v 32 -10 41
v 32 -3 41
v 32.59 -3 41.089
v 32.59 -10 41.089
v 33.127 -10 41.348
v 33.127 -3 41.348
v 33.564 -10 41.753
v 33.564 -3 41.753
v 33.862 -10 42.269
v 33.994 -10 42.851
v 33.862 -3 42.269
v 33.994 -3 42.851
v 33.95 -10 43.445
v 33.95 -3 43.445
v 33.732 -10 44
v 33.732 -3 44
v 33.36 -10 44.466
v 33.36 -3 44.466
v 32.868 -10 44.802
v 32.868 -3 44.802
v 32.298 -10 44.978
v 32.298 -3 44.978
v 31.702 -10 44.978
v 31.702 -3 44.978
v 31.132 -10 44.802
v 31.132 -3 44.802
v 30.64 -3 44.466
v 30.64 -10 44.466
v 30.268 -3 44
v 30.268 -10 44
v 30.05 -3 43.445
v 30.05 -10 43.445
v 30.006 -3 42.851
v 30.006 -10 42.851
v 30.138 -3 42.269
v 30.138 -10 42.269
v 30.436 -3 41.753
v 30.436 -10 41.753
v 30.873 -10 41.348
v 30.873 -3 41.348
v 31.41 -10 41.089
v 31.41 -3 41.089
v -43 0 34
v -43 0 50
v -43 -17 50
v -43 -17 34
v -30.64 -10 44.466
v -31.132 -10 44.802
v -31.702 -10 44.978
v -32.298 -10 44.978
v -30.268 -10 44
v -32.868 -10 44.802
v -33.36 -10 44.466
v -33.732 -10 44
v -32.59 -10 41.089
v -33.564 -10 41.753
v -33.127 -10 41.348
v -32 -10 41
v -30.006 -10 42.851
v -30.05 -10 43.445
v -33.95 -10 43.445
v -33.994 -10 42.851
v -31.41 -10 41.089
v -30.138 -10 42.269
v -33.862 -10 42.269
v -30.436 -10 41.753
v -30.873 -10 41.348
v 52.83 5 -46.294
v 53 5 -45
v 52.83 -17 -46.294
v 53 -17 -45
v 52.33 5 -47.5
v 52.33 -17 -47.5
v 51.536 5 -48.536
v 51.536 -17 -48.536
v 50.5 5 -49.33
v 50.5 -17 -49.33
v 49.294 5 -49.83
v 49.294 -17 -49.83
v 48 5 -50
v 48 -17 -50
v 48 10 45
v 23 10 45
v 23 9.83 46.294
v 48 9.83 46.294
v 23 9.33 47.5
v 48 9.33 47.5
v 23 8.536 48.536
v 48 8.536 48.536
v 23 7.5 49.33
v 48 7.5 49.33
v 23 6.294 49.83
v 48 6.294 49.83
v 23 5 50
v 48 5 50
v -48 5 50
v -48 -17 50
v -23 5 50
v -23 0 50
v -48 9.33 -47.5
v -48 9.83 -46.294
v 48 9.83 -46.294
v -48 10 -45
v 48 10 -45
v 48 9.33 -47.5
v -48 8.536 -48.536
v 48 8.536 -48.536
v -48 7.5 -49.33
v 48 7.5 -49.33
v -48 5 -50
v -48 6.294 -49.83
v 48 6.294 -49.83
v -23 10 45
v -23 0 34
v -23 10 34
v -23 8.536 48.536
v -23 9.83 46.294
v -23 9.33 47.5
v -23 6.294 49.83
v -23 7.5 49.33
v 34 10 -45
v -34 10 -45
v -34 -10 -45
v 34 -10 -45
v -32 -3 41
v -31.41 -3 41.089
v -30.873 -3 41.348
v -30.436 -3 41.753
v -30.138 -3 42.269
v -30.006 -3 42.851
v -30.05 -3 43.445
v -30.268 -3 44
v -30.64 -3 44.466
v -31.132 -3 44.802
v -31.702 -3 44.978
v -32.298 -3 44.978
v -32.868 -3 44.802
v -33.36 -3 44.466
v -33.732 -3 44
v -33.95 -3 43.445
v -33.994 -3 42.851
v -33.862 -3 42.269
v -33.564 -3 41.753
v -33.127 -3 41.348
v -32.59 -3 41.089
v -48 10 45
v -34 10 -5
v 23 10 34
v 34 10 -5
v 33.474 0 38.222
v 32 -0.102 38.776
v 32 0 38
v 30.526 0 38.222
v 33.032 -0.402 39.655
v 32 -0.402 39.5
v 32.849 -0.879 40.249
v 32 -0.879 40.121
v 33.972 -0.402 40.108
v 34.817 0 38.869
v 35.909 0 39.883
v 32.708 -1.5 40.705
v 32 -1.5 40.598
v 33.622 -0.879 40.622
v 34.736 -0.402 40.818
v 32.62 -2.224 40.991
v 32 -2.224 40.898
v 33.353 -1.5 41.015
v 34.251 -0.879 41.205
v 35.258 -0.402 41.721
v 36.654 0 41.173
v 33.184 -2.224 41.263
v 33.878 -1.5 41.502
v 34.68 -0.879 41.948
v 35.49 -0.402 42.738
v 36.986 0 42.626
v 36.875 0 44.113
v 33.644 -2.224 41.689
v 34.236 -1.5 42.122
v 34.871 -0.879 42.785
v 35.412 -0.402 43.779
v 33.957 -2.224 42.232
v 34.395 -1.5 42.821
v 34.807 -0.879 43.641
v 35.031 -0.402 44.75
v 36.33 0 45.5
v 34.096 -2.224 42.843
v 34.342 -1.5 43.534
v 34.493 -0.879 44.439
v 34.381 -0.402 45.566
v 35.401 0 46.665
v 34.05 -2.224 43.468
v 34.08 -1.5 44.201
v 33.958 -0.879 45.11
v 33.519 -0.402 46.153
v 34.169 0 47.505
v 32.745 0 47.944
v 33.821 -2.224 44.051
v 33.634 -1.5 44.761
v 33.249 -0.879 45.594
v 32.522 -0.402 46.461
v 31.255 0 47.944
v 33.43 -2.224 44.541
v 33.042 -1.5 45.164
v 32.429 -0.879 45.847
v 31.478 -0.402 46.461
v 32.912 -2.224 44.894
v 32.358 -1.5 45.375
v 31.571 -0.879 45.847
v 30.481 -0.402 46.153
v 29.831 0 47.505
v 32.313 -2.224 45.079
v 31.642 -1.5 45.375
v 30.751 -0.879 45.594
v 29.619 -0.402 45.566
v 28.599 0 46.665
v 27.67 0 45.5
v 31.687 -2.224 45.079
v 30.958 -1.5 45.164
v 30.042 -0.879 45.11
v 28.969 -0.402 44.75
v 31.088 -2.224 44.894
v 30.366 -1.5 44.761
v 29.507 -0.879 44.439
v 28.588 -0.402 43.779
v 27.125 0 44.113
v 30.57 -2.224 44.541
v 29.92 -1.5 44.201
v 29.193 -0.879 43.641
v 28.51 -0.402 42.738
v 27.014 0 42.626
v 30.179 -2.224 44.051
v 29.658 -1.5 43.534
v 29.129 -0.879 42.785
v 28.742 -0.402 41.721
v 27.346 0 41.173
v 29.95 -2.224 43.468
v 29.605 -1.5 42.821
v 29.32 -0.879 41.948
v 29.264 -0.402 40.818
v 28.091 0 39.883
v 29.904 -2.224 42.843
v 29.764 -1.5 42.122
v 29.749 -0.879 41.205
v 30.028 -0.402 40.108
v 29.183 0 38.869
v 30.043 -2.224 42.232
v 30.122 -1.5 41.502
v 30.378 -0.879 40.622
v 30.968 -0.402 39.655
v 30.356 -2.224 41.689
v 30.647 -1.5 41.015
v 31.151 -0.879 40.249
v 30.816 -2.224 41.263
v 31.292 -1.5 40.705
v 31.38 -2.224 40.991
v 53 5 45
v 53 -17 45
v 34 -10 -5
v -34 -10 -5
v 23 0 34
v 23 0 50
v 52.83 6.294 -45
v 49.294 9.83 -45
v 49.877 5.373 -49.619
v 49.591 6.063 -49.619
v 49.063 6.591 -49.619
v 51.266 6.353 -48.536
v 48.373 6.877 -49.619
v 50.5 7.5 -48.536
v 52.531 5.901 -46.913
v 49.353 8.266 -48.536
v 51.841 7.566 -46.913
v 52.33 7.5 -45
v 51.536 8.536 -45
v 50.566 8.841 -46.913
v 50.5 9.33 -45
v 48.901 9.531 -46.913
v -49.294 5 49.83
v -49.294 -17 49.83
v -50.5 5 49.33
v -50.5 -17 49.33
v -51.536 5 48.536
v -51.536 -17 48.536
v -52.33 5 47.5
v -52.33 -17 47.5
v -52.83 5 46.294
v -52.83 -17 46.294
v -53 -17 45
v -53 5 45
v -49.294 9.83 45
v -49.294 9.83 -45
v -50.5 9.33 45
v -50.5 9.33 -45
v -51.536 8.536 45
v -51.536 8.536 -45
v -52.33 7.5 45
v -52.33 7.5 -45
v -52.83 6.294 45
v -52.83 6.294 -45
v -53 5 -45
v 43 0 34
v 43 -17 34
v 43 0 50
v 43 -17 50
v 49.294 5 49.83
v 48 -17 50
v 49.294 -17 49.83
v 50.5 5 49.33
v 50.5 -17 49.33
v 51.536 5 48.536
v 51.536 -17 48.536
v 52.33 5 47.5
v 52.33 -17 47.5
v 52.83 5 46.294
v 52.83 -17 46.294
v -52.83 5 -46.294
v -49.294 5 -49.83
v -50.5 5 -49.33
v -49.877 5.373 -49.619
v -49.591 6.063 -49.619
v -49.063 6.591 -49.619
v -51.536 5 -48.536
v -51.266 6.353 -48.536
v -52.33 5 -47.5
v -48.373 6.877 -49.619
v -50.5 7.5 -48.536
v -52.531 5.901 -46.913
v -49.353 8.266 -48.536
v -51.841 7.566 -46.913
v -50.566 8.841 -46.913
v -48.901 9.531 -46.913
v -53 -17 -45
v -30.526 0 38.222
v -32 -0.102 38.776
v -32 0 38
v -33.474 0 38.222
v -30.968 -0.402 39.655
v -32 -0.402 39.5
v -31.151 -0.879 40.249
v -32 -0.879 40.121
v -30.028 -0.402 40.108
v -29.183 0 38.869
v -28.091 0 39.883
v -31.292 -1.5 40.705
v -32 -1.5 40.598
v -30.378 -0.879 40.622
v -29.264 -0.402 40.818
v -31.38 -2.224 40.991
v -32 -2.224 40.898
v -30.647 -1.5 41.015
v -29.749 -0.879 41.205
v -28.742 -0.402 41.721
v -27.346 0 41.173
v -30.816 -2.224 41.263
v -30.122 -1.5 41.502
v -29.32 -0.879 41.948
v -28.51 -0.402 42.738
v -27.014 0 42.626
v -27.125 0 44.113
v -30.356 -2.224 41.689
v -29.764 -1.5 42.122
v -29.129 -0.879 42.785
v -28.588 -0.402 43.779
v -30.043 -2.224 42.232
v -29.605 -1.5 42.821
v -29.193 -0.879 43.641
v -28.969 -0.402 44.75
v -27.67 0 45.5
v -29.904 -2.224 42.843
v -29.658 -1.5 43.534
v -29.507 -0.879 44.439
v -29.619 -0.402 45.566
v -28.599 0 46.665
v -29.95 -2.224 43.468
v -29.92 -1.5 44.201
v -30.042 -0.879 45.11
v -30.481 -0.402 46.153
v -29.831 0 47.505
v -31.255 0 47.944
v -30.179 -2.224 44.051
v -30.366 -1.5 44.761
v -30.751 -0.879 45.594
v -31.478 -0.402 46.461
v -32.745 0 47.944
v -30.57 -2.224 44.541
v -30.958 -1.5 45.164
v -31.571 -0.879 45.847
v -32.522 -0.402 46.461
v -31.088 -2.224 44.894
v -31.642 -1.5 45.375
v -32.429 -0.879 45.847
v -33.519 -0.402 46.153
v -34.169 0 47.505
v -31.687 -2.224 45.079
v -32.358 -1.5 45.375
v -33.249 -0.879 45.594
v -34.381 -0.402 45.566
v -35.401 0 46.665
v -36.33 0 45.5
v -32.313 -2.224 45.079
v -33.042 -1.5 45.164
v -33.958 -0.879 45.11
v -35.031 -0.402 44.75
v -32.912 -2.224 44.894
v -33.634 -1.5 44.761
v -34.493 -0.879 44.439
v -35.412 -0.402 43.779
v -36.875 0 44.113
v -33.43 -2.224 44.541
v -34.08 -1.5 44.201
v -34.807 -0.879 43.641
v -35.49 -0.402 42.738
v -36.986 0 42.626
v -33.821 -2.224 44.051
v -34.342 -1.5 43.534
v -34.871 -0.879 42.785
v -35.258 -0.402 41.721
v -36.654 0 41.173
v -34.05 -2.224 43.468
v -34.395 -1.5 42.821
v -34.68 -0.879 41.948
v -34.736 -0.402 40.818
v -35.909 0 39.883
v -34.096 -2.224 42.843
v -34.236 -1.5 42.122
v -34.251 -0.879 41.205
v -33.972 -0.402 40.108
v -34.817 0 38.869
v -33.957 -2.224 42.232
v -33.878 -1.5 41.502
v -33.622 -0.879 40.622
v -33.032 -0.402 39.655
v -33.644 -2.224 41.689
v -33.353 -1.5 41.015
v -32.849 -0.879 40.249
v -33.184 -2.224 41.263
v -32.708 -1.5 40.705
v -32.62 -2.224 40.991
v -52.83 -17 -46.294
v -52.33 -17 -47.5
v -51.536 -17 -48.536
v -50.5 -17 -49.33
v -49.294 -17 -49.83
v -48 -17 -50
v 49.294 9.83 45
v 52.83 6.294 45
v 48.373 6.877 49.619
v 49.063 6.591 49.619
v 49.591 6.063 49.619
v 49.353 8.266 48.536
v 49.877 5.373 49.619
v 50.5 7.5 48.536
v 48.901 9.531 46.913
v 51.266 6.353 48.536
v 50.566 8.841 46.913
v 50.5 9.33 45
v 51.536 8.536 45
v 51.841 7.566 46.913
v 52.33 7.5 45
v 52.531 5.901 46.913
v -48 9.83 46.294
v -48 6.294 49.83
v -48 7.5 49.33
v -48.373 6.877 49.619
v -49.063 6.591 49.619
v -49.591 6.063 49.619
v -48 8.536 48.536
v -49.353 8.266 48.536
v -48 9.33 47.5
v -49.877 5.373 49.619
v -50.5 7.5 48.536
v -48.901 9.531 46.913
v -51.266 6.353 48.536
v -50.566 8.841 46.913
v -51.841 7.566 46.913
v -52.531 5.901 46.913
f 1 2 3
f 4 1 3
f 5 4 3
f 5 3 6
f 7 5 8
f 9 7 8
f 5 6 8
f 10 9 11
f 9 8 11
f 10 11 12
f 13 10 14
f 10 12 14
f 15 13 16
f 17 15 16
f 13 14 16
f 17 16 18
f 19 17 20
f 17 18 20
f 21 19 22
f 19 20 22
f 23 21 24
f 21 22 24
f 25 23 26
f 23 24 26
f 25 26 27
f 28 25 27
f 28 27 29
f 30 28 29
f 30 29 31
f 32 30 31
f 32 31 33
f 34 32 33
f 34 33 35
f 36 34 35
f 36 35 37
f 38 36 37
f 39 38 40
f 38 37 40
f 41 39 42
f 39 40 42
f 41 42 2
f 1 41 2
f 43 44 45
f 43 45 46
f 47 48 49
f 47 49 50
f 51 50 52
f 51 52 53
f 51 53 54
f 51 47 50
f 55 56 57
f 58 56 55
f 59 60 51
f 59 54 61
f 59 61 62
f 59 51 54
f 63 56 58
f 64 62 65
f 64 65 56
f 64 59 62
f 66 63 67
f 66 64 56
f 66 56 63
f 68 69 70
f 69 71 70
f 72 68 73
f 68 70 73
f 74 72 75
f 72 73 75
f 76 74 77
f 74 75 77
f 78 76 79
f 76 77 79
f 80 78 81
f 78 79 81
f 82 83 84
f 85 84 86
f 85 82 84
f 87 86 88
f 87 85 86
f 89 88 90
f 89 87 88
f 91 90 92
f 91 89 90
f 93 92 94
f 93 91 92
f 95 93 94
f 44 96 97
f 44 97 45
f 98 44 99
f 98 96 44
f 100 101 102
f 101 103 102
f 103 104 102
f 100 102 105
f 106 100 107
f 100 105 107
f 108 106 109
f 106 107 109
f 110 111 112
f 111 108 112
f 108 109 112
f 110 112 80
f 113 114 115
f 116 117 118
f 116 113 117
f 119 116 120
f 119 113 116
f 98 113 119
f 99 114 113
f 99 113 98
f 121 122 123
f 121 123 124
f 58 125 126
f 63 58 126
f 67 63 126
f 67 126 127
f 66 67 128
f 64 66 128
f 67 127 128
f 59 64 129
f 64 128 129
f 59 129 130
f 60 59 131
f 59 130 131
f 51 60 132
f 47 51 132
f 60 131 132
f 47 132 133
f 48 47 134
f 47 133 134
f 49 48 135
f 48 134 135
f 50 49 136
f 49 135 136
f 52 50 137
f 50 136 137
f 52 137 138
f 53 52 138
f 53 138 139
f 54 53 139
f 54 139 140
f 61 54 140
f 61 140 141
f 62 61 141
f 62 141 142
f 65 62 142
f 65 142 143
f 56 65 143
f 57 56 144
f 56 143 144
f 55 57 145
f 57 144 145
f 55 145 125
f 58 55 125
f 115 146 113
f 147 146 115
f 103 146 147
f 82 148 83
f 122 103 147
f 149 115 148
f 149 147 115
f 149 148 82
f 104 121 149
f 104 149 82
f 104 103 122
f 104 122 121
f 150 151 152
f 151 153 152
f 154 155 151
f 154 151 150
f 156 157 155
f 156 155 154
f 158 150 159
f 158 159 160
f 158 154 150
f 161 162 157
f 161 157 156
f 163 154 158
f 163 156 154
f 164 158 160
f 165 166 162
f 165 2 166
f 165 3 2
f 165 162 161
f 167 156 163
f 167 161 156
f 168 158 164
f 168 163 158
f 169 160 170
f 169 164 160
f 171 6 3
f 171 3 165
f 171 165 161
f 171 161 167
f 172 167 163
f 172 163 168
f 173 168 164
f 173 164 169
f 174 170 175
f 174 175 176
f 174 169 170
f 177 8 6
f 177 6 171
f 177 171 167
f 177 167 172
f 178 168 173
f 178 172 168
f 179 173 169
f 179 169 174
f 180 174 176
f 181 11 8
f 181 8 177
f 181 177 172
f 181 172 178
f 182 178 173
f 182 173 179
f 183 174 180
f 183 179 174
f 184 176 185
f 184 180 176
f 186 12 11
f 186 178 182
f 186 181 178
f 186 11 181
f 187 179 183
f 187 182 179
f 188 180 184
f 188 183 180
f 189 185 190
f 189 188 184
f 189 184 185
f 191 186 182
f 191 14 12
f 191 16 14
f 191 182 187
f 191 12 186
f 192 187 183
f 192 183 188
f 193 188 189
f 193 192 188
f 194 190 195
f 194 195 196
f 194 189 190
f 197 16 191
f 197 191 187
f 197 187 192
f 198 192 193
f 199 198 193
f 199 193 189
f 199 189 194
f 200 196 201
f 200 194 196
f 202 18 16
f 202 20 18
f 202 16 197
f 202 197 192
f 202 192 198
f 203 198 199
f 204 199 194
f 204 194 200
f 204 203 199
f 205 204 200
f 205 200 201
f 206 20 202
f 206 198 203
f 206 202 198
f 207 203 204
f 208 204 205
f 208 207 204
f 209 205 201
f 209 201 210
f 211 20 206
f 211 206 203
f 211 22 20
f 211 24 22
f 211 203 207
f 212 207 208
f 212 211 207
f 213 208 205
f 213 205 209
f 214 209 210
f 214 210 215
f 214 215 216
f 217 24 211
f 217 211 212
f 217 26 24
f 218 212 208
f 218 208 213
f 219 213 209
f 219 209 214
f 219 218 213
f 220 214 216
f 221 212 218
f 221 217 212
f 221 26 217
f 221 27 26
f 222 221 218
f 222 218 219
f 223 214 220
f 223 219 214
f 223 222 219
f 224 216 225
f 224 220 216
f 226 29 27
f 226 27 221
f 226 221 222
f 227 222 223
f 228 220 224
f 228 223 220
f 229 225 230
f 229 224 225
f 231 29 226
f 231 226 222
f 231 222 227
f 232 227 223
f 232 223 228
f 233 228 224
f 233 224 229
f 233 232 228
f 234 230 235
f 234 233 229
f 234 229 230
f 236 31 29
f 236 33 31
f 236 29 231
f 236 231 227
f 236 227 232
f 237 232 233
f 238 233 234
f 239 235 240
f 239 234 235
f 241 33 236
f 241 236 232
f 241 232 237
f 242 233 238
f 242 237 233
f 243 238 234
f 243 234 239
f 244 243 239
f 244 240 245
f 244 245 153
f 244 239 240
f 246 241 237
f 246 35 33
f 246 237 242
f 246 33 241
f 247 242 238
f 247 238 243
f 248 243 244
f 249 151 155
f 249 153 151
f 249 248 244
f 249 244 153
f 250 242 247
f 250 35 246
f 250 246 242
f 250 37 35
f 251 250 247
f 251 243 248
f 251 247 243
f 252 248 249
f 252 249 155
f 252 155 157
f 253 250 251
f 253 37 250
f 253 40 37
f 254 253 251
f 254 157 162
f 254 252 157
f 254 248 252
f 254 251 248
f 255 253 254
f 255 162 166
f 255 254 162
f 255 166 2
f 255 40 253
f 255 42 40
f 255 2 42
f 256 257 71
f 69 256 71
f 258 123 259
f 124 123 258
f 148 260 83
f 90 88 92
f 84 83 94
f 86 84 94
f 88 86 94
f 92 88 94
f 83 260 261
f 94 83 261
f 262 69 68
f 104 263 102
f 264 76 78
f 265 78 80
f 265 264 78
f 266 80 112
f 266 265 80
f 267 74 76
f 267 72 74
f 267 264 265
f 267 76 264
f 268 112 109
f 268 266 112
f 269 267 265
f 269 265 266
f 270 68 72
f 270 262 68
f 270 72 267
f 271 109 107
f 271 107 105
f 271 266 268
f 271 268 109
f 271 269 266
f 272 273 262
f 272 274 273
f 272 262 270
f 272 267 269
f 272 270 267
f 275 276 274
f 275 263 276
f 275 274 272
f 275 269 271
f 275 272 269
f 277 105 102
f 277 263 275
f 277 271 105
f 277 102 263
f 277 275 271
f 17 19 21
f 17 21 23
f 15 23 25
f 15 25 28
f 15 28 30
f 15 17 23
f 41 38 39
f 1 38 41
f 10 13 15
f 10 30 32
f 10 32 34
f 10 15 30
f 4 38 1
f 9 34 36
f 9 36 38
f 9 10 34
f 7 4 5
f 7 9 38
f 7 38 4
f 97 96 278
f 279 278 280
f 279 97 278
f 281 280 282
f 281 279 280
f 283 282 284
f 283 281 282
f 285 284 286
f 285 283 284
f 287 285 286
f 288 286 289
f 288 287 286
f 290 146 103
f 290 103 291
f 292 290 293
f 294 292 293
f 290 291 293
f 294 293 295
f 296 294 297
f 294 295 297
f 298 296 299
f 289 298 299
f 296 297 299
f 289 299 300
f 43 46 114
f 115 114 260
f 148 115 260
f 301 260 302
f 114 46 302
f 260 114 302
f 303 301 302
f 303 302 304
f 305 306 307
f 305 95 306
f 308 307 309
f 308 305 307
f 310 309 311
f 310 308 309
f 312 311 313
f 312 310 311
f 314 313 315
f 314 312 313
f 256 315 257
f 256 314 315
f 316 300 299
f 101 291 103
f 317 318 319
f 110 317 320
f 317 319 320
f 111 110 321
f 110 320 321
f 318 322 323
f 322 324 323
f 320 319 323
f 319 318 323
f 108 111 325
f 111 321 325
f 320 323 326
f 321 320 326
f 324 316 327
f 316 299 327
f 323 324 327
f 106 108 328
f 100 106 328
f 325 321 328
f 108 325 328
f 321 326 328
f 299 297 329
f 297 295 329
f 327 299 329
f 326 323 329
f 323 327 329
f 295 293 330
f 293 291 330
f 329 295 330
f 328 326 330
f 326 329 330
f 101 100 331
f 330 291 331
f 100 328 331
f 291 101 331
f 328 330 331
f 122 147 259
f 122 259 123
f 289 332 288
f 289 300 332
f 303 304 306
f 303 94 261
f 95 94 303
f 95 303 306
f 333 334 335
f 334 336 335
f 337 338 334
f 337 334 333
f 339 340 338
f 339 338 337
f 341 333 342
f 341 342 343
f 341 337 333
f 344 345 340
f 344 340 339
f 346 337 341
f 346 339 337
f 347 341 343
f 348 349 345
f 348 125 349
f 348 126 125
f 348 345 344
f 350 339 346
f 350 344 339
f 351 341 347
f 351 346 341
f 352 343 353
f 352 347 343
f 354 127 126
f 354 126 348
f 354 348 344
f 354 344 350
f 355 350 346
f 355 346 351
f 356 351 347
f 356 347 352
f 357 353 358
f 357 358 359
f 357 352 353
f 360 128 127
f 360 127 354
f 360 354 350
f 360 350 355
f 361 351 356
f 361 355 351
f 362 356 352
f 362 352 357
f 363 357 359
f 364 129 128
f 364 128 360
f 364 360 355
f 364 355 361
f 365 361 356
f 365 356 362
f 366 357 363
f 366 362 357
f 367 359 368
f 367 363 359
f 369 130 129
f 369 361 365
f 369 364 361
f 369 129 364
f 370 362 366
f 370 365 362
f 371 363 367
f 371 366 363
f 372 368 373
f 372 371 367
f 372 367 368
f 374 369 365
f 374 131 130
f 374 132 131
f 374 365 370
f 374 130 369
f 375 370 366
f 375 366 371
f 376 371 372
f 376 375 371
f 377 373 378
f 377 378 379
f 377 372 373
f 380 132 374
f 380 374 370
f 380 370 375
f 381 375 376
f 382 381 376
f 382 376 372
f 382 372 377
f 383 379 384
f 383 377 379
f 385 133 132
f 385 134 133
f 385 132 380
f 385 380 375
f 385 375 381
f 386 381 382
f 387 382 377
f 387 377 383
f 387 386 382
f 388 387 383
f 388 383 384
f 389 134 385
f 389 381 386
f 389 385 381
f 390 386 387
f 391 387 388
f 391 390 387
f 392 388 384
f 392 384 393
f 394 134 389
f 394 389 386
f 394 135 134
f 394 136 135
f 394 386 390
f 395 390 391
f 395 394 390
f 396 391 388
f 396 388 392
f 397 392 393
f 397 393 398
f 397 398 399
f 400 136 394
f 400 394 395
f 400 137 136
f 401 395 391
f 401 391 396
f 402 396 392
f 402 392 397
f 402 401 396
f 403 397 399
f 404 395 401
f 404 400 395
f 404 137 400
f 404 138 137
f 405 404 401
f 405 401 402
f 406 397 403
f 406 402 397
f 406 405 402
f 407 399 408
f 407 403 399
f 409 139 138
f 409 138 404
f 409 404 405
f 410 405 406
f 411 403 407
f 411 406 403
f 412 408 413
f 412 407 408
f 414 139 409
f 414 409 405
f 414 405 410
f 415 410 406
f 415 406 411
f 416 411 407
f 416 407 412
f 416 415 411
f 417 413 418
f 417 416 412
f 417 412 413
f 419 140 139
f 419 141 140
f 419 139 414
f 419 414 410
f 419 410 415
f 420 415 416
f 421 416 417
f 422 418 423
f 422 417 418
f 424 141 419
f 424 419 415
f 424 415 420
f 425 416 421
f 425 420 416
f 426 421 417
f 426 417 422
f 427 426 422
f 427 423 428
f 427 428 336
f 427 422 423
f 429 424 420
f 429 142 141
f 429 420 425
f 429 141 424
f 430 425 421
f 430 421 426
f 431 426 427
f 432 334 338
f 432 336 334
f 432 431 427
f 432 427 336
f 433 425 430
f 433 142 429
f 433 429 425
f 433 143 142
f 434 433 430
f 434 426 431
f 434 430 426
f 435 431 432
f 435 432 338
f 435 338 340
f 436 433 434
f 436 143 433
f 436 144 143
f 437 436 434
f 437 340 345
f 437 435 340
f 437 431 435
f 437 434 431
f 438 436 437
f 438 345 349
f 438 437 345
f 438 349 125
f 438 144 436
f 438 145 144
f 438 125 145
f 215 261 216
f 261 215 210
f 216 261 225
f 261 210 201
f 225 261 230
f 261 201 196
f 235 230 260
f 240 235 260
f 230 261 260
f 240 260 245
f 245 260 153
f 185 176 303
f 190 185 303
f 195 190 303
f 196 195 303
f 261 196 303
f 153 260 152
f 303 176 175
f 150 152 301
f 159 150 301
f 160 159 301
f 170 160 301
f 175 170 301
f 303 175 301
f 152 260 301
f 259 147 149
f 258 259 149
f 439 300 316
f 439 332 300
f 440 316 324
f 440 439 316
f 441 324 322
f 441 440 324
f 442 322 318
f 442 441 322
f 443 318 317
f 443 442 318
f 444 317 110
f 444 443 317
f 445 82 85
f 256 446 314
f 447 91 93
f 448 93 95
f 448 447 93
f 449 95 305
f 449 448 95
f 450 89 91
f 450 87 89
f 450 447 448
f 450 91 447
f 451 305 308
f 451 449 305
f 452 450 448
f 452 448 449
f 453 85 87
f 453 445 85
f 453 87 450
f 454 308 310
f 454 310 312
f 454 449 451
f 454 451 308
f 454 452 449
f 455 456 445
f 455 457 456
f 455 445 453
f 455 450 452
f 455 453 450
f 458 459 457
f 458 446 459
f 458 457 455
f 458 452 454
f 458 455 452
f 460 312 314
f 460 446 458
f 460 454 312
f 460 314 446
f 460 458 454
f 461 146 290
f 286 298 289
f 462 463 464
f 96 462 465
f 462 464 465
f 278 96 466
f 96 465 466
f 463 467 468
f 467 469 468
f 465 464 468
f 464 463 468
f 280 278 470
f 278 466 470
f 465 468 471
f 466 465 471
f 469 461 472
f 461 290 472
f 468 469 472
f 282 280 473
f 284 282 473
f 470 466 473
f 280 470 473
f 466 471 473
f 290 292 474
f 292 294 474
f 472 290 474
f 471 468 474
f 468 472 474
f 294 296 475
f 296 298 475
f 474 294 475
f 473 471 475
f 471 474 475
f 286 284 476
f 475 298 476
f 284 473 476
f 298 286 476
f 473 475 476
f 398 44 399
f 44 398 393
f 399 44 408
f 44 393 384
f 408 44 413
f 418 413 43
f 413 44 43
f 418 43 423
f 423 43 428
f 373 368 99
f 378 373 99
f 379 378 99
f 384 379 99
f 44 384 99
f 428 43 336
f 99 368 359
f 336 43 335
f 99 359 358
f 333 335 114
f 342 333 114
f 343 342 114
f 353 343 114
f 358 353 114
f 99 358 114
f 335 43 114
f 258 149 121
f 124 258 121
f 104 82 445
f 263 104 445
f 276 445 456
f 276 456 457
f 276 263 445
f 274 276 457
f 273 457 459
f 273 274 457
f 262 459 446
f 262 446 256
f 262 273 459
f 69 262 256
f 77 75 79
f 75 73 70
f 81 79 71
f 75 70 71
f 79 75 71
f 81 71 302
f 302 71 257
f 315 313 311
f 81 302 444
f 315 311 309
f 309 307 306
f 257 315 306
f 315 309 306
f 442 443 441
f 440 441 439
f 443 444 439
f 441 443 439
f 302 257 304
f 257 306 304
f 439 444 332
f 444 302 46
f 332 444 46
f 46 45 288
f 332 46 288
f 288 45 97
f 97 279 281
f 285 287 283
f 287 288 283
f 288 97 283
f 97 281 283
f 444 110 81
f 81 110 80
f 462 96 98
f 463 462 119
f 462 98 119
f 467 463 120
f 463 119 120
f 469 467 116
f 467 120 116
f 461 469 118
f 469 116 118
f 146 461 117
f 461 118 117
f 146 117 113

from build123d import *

# Parameters (mm, degrees)
SKETCH_2_W          = 106
SKETCH_2_H          = 100
EXTRUDE_1_DEPTH     = 10
SKETCH_3_R          = 2
EXTRUDE_2_DEPTH     = 10
EXTRUDE_3_DEPTH     = 17
SKETCH_5_W          = 68
SKETCH_5_H          = 40
CUT_EXTRUDE_1_DEPTH = 20
SKETCH_6_W          = 46
SKETCH_6_H          = 32
CUT_EXTRUDE_2_DEPTH = 20
FILLET_1_R          = 3
FILLET_2_R          = 5


with BuildPart() as part:
    # 草图2 → 凸台-拉伸1 (new body)
    with BuildSketch(Plane(origin=(0, 0, 0), x_dir=(1, 0, 0), z_dir=(0, 1, 0))):
        Rectangle(SKETCH_2_W, SKETCH_2_H)
    extrude(amount=EXTRUDE_1_DEPTH)

    # 草图3 → 凸台-拉伸2 (add)
    with BuildSketch(Plane.XZ):
        with Locations(Location((-32, 43, 0), (0, 0, 270))):
            Circle(SKETCH_3_R)
        with Locations(Location((32, 43, 0), (0, 0, 270))):
            Circle(SKETCH_3_R)
    extrude(amount=EXTRUDE_2_DEPTH)

    # 草图4 → 凸台-拉伸3 (add)
    with BuildSketch(Plane.XZ):
        Polygon((-53, 50), (-43, 50), (-43, 34), (43, 34), (43, 50), (53, 50), (53, -50), (43, -50), (-43, -50), (-53, -50), align=None)
    extrude(amount=EXTRUDE_3_DEPTH)

    # 草图5 → 切除-拉伸1 (cut)
    with BuildSketch(Plane(origin=(0, 10, 0), x_dir=(1, 0, 0), z_dir=(0, 1, 0))):
        with Locations((0, 25)):
            Rectangle(SKETCH_5_W, SKETCH_5_H)
    extrude(amount=-CUT_EXTRUDE_1_DEPTH, mode=Mode.SUBTRACT)

    # 草图6 → 切除-拉伸2 (cut)
    with BuildSketch(Plane.XZ):
        with Locations((0, 50)):
            Rectangle(SKETCH_6_W, SKETCH_6_H)
    extrude(amount=-CUT_EXTRUDE_2_DEPTH, mode=Mode.SUBTRACT)

    # 圆角1
    fillet_1_edges = [part.edges().sort_by_distance(p)[0] for p in [
        (-32, 0, 45),
        (32, 0, 45),
    ]]
    fillet(fillet_1_edges, radius=FILLET_1_R)

    # 圆角2
    fillet_2_edges = [part.edges().sort_by_distance(p)[0] for p in [
        (-53, 10, 0),
        (-38, 10, 50),
        (53, 10, 0),
        (38, 10, 50),
        (53, -3.5, 50),
        (-53, -3.5, 50),
        (-53, -3.5, -50),
        (53, -3.5, -50),
        (0, 10, -50),
    ]]
    fillet(fillet_2_edges, radius=FILLET_2_R - 0.0001)  # a hair under: the kernel refuses the full size


solid = part.part
